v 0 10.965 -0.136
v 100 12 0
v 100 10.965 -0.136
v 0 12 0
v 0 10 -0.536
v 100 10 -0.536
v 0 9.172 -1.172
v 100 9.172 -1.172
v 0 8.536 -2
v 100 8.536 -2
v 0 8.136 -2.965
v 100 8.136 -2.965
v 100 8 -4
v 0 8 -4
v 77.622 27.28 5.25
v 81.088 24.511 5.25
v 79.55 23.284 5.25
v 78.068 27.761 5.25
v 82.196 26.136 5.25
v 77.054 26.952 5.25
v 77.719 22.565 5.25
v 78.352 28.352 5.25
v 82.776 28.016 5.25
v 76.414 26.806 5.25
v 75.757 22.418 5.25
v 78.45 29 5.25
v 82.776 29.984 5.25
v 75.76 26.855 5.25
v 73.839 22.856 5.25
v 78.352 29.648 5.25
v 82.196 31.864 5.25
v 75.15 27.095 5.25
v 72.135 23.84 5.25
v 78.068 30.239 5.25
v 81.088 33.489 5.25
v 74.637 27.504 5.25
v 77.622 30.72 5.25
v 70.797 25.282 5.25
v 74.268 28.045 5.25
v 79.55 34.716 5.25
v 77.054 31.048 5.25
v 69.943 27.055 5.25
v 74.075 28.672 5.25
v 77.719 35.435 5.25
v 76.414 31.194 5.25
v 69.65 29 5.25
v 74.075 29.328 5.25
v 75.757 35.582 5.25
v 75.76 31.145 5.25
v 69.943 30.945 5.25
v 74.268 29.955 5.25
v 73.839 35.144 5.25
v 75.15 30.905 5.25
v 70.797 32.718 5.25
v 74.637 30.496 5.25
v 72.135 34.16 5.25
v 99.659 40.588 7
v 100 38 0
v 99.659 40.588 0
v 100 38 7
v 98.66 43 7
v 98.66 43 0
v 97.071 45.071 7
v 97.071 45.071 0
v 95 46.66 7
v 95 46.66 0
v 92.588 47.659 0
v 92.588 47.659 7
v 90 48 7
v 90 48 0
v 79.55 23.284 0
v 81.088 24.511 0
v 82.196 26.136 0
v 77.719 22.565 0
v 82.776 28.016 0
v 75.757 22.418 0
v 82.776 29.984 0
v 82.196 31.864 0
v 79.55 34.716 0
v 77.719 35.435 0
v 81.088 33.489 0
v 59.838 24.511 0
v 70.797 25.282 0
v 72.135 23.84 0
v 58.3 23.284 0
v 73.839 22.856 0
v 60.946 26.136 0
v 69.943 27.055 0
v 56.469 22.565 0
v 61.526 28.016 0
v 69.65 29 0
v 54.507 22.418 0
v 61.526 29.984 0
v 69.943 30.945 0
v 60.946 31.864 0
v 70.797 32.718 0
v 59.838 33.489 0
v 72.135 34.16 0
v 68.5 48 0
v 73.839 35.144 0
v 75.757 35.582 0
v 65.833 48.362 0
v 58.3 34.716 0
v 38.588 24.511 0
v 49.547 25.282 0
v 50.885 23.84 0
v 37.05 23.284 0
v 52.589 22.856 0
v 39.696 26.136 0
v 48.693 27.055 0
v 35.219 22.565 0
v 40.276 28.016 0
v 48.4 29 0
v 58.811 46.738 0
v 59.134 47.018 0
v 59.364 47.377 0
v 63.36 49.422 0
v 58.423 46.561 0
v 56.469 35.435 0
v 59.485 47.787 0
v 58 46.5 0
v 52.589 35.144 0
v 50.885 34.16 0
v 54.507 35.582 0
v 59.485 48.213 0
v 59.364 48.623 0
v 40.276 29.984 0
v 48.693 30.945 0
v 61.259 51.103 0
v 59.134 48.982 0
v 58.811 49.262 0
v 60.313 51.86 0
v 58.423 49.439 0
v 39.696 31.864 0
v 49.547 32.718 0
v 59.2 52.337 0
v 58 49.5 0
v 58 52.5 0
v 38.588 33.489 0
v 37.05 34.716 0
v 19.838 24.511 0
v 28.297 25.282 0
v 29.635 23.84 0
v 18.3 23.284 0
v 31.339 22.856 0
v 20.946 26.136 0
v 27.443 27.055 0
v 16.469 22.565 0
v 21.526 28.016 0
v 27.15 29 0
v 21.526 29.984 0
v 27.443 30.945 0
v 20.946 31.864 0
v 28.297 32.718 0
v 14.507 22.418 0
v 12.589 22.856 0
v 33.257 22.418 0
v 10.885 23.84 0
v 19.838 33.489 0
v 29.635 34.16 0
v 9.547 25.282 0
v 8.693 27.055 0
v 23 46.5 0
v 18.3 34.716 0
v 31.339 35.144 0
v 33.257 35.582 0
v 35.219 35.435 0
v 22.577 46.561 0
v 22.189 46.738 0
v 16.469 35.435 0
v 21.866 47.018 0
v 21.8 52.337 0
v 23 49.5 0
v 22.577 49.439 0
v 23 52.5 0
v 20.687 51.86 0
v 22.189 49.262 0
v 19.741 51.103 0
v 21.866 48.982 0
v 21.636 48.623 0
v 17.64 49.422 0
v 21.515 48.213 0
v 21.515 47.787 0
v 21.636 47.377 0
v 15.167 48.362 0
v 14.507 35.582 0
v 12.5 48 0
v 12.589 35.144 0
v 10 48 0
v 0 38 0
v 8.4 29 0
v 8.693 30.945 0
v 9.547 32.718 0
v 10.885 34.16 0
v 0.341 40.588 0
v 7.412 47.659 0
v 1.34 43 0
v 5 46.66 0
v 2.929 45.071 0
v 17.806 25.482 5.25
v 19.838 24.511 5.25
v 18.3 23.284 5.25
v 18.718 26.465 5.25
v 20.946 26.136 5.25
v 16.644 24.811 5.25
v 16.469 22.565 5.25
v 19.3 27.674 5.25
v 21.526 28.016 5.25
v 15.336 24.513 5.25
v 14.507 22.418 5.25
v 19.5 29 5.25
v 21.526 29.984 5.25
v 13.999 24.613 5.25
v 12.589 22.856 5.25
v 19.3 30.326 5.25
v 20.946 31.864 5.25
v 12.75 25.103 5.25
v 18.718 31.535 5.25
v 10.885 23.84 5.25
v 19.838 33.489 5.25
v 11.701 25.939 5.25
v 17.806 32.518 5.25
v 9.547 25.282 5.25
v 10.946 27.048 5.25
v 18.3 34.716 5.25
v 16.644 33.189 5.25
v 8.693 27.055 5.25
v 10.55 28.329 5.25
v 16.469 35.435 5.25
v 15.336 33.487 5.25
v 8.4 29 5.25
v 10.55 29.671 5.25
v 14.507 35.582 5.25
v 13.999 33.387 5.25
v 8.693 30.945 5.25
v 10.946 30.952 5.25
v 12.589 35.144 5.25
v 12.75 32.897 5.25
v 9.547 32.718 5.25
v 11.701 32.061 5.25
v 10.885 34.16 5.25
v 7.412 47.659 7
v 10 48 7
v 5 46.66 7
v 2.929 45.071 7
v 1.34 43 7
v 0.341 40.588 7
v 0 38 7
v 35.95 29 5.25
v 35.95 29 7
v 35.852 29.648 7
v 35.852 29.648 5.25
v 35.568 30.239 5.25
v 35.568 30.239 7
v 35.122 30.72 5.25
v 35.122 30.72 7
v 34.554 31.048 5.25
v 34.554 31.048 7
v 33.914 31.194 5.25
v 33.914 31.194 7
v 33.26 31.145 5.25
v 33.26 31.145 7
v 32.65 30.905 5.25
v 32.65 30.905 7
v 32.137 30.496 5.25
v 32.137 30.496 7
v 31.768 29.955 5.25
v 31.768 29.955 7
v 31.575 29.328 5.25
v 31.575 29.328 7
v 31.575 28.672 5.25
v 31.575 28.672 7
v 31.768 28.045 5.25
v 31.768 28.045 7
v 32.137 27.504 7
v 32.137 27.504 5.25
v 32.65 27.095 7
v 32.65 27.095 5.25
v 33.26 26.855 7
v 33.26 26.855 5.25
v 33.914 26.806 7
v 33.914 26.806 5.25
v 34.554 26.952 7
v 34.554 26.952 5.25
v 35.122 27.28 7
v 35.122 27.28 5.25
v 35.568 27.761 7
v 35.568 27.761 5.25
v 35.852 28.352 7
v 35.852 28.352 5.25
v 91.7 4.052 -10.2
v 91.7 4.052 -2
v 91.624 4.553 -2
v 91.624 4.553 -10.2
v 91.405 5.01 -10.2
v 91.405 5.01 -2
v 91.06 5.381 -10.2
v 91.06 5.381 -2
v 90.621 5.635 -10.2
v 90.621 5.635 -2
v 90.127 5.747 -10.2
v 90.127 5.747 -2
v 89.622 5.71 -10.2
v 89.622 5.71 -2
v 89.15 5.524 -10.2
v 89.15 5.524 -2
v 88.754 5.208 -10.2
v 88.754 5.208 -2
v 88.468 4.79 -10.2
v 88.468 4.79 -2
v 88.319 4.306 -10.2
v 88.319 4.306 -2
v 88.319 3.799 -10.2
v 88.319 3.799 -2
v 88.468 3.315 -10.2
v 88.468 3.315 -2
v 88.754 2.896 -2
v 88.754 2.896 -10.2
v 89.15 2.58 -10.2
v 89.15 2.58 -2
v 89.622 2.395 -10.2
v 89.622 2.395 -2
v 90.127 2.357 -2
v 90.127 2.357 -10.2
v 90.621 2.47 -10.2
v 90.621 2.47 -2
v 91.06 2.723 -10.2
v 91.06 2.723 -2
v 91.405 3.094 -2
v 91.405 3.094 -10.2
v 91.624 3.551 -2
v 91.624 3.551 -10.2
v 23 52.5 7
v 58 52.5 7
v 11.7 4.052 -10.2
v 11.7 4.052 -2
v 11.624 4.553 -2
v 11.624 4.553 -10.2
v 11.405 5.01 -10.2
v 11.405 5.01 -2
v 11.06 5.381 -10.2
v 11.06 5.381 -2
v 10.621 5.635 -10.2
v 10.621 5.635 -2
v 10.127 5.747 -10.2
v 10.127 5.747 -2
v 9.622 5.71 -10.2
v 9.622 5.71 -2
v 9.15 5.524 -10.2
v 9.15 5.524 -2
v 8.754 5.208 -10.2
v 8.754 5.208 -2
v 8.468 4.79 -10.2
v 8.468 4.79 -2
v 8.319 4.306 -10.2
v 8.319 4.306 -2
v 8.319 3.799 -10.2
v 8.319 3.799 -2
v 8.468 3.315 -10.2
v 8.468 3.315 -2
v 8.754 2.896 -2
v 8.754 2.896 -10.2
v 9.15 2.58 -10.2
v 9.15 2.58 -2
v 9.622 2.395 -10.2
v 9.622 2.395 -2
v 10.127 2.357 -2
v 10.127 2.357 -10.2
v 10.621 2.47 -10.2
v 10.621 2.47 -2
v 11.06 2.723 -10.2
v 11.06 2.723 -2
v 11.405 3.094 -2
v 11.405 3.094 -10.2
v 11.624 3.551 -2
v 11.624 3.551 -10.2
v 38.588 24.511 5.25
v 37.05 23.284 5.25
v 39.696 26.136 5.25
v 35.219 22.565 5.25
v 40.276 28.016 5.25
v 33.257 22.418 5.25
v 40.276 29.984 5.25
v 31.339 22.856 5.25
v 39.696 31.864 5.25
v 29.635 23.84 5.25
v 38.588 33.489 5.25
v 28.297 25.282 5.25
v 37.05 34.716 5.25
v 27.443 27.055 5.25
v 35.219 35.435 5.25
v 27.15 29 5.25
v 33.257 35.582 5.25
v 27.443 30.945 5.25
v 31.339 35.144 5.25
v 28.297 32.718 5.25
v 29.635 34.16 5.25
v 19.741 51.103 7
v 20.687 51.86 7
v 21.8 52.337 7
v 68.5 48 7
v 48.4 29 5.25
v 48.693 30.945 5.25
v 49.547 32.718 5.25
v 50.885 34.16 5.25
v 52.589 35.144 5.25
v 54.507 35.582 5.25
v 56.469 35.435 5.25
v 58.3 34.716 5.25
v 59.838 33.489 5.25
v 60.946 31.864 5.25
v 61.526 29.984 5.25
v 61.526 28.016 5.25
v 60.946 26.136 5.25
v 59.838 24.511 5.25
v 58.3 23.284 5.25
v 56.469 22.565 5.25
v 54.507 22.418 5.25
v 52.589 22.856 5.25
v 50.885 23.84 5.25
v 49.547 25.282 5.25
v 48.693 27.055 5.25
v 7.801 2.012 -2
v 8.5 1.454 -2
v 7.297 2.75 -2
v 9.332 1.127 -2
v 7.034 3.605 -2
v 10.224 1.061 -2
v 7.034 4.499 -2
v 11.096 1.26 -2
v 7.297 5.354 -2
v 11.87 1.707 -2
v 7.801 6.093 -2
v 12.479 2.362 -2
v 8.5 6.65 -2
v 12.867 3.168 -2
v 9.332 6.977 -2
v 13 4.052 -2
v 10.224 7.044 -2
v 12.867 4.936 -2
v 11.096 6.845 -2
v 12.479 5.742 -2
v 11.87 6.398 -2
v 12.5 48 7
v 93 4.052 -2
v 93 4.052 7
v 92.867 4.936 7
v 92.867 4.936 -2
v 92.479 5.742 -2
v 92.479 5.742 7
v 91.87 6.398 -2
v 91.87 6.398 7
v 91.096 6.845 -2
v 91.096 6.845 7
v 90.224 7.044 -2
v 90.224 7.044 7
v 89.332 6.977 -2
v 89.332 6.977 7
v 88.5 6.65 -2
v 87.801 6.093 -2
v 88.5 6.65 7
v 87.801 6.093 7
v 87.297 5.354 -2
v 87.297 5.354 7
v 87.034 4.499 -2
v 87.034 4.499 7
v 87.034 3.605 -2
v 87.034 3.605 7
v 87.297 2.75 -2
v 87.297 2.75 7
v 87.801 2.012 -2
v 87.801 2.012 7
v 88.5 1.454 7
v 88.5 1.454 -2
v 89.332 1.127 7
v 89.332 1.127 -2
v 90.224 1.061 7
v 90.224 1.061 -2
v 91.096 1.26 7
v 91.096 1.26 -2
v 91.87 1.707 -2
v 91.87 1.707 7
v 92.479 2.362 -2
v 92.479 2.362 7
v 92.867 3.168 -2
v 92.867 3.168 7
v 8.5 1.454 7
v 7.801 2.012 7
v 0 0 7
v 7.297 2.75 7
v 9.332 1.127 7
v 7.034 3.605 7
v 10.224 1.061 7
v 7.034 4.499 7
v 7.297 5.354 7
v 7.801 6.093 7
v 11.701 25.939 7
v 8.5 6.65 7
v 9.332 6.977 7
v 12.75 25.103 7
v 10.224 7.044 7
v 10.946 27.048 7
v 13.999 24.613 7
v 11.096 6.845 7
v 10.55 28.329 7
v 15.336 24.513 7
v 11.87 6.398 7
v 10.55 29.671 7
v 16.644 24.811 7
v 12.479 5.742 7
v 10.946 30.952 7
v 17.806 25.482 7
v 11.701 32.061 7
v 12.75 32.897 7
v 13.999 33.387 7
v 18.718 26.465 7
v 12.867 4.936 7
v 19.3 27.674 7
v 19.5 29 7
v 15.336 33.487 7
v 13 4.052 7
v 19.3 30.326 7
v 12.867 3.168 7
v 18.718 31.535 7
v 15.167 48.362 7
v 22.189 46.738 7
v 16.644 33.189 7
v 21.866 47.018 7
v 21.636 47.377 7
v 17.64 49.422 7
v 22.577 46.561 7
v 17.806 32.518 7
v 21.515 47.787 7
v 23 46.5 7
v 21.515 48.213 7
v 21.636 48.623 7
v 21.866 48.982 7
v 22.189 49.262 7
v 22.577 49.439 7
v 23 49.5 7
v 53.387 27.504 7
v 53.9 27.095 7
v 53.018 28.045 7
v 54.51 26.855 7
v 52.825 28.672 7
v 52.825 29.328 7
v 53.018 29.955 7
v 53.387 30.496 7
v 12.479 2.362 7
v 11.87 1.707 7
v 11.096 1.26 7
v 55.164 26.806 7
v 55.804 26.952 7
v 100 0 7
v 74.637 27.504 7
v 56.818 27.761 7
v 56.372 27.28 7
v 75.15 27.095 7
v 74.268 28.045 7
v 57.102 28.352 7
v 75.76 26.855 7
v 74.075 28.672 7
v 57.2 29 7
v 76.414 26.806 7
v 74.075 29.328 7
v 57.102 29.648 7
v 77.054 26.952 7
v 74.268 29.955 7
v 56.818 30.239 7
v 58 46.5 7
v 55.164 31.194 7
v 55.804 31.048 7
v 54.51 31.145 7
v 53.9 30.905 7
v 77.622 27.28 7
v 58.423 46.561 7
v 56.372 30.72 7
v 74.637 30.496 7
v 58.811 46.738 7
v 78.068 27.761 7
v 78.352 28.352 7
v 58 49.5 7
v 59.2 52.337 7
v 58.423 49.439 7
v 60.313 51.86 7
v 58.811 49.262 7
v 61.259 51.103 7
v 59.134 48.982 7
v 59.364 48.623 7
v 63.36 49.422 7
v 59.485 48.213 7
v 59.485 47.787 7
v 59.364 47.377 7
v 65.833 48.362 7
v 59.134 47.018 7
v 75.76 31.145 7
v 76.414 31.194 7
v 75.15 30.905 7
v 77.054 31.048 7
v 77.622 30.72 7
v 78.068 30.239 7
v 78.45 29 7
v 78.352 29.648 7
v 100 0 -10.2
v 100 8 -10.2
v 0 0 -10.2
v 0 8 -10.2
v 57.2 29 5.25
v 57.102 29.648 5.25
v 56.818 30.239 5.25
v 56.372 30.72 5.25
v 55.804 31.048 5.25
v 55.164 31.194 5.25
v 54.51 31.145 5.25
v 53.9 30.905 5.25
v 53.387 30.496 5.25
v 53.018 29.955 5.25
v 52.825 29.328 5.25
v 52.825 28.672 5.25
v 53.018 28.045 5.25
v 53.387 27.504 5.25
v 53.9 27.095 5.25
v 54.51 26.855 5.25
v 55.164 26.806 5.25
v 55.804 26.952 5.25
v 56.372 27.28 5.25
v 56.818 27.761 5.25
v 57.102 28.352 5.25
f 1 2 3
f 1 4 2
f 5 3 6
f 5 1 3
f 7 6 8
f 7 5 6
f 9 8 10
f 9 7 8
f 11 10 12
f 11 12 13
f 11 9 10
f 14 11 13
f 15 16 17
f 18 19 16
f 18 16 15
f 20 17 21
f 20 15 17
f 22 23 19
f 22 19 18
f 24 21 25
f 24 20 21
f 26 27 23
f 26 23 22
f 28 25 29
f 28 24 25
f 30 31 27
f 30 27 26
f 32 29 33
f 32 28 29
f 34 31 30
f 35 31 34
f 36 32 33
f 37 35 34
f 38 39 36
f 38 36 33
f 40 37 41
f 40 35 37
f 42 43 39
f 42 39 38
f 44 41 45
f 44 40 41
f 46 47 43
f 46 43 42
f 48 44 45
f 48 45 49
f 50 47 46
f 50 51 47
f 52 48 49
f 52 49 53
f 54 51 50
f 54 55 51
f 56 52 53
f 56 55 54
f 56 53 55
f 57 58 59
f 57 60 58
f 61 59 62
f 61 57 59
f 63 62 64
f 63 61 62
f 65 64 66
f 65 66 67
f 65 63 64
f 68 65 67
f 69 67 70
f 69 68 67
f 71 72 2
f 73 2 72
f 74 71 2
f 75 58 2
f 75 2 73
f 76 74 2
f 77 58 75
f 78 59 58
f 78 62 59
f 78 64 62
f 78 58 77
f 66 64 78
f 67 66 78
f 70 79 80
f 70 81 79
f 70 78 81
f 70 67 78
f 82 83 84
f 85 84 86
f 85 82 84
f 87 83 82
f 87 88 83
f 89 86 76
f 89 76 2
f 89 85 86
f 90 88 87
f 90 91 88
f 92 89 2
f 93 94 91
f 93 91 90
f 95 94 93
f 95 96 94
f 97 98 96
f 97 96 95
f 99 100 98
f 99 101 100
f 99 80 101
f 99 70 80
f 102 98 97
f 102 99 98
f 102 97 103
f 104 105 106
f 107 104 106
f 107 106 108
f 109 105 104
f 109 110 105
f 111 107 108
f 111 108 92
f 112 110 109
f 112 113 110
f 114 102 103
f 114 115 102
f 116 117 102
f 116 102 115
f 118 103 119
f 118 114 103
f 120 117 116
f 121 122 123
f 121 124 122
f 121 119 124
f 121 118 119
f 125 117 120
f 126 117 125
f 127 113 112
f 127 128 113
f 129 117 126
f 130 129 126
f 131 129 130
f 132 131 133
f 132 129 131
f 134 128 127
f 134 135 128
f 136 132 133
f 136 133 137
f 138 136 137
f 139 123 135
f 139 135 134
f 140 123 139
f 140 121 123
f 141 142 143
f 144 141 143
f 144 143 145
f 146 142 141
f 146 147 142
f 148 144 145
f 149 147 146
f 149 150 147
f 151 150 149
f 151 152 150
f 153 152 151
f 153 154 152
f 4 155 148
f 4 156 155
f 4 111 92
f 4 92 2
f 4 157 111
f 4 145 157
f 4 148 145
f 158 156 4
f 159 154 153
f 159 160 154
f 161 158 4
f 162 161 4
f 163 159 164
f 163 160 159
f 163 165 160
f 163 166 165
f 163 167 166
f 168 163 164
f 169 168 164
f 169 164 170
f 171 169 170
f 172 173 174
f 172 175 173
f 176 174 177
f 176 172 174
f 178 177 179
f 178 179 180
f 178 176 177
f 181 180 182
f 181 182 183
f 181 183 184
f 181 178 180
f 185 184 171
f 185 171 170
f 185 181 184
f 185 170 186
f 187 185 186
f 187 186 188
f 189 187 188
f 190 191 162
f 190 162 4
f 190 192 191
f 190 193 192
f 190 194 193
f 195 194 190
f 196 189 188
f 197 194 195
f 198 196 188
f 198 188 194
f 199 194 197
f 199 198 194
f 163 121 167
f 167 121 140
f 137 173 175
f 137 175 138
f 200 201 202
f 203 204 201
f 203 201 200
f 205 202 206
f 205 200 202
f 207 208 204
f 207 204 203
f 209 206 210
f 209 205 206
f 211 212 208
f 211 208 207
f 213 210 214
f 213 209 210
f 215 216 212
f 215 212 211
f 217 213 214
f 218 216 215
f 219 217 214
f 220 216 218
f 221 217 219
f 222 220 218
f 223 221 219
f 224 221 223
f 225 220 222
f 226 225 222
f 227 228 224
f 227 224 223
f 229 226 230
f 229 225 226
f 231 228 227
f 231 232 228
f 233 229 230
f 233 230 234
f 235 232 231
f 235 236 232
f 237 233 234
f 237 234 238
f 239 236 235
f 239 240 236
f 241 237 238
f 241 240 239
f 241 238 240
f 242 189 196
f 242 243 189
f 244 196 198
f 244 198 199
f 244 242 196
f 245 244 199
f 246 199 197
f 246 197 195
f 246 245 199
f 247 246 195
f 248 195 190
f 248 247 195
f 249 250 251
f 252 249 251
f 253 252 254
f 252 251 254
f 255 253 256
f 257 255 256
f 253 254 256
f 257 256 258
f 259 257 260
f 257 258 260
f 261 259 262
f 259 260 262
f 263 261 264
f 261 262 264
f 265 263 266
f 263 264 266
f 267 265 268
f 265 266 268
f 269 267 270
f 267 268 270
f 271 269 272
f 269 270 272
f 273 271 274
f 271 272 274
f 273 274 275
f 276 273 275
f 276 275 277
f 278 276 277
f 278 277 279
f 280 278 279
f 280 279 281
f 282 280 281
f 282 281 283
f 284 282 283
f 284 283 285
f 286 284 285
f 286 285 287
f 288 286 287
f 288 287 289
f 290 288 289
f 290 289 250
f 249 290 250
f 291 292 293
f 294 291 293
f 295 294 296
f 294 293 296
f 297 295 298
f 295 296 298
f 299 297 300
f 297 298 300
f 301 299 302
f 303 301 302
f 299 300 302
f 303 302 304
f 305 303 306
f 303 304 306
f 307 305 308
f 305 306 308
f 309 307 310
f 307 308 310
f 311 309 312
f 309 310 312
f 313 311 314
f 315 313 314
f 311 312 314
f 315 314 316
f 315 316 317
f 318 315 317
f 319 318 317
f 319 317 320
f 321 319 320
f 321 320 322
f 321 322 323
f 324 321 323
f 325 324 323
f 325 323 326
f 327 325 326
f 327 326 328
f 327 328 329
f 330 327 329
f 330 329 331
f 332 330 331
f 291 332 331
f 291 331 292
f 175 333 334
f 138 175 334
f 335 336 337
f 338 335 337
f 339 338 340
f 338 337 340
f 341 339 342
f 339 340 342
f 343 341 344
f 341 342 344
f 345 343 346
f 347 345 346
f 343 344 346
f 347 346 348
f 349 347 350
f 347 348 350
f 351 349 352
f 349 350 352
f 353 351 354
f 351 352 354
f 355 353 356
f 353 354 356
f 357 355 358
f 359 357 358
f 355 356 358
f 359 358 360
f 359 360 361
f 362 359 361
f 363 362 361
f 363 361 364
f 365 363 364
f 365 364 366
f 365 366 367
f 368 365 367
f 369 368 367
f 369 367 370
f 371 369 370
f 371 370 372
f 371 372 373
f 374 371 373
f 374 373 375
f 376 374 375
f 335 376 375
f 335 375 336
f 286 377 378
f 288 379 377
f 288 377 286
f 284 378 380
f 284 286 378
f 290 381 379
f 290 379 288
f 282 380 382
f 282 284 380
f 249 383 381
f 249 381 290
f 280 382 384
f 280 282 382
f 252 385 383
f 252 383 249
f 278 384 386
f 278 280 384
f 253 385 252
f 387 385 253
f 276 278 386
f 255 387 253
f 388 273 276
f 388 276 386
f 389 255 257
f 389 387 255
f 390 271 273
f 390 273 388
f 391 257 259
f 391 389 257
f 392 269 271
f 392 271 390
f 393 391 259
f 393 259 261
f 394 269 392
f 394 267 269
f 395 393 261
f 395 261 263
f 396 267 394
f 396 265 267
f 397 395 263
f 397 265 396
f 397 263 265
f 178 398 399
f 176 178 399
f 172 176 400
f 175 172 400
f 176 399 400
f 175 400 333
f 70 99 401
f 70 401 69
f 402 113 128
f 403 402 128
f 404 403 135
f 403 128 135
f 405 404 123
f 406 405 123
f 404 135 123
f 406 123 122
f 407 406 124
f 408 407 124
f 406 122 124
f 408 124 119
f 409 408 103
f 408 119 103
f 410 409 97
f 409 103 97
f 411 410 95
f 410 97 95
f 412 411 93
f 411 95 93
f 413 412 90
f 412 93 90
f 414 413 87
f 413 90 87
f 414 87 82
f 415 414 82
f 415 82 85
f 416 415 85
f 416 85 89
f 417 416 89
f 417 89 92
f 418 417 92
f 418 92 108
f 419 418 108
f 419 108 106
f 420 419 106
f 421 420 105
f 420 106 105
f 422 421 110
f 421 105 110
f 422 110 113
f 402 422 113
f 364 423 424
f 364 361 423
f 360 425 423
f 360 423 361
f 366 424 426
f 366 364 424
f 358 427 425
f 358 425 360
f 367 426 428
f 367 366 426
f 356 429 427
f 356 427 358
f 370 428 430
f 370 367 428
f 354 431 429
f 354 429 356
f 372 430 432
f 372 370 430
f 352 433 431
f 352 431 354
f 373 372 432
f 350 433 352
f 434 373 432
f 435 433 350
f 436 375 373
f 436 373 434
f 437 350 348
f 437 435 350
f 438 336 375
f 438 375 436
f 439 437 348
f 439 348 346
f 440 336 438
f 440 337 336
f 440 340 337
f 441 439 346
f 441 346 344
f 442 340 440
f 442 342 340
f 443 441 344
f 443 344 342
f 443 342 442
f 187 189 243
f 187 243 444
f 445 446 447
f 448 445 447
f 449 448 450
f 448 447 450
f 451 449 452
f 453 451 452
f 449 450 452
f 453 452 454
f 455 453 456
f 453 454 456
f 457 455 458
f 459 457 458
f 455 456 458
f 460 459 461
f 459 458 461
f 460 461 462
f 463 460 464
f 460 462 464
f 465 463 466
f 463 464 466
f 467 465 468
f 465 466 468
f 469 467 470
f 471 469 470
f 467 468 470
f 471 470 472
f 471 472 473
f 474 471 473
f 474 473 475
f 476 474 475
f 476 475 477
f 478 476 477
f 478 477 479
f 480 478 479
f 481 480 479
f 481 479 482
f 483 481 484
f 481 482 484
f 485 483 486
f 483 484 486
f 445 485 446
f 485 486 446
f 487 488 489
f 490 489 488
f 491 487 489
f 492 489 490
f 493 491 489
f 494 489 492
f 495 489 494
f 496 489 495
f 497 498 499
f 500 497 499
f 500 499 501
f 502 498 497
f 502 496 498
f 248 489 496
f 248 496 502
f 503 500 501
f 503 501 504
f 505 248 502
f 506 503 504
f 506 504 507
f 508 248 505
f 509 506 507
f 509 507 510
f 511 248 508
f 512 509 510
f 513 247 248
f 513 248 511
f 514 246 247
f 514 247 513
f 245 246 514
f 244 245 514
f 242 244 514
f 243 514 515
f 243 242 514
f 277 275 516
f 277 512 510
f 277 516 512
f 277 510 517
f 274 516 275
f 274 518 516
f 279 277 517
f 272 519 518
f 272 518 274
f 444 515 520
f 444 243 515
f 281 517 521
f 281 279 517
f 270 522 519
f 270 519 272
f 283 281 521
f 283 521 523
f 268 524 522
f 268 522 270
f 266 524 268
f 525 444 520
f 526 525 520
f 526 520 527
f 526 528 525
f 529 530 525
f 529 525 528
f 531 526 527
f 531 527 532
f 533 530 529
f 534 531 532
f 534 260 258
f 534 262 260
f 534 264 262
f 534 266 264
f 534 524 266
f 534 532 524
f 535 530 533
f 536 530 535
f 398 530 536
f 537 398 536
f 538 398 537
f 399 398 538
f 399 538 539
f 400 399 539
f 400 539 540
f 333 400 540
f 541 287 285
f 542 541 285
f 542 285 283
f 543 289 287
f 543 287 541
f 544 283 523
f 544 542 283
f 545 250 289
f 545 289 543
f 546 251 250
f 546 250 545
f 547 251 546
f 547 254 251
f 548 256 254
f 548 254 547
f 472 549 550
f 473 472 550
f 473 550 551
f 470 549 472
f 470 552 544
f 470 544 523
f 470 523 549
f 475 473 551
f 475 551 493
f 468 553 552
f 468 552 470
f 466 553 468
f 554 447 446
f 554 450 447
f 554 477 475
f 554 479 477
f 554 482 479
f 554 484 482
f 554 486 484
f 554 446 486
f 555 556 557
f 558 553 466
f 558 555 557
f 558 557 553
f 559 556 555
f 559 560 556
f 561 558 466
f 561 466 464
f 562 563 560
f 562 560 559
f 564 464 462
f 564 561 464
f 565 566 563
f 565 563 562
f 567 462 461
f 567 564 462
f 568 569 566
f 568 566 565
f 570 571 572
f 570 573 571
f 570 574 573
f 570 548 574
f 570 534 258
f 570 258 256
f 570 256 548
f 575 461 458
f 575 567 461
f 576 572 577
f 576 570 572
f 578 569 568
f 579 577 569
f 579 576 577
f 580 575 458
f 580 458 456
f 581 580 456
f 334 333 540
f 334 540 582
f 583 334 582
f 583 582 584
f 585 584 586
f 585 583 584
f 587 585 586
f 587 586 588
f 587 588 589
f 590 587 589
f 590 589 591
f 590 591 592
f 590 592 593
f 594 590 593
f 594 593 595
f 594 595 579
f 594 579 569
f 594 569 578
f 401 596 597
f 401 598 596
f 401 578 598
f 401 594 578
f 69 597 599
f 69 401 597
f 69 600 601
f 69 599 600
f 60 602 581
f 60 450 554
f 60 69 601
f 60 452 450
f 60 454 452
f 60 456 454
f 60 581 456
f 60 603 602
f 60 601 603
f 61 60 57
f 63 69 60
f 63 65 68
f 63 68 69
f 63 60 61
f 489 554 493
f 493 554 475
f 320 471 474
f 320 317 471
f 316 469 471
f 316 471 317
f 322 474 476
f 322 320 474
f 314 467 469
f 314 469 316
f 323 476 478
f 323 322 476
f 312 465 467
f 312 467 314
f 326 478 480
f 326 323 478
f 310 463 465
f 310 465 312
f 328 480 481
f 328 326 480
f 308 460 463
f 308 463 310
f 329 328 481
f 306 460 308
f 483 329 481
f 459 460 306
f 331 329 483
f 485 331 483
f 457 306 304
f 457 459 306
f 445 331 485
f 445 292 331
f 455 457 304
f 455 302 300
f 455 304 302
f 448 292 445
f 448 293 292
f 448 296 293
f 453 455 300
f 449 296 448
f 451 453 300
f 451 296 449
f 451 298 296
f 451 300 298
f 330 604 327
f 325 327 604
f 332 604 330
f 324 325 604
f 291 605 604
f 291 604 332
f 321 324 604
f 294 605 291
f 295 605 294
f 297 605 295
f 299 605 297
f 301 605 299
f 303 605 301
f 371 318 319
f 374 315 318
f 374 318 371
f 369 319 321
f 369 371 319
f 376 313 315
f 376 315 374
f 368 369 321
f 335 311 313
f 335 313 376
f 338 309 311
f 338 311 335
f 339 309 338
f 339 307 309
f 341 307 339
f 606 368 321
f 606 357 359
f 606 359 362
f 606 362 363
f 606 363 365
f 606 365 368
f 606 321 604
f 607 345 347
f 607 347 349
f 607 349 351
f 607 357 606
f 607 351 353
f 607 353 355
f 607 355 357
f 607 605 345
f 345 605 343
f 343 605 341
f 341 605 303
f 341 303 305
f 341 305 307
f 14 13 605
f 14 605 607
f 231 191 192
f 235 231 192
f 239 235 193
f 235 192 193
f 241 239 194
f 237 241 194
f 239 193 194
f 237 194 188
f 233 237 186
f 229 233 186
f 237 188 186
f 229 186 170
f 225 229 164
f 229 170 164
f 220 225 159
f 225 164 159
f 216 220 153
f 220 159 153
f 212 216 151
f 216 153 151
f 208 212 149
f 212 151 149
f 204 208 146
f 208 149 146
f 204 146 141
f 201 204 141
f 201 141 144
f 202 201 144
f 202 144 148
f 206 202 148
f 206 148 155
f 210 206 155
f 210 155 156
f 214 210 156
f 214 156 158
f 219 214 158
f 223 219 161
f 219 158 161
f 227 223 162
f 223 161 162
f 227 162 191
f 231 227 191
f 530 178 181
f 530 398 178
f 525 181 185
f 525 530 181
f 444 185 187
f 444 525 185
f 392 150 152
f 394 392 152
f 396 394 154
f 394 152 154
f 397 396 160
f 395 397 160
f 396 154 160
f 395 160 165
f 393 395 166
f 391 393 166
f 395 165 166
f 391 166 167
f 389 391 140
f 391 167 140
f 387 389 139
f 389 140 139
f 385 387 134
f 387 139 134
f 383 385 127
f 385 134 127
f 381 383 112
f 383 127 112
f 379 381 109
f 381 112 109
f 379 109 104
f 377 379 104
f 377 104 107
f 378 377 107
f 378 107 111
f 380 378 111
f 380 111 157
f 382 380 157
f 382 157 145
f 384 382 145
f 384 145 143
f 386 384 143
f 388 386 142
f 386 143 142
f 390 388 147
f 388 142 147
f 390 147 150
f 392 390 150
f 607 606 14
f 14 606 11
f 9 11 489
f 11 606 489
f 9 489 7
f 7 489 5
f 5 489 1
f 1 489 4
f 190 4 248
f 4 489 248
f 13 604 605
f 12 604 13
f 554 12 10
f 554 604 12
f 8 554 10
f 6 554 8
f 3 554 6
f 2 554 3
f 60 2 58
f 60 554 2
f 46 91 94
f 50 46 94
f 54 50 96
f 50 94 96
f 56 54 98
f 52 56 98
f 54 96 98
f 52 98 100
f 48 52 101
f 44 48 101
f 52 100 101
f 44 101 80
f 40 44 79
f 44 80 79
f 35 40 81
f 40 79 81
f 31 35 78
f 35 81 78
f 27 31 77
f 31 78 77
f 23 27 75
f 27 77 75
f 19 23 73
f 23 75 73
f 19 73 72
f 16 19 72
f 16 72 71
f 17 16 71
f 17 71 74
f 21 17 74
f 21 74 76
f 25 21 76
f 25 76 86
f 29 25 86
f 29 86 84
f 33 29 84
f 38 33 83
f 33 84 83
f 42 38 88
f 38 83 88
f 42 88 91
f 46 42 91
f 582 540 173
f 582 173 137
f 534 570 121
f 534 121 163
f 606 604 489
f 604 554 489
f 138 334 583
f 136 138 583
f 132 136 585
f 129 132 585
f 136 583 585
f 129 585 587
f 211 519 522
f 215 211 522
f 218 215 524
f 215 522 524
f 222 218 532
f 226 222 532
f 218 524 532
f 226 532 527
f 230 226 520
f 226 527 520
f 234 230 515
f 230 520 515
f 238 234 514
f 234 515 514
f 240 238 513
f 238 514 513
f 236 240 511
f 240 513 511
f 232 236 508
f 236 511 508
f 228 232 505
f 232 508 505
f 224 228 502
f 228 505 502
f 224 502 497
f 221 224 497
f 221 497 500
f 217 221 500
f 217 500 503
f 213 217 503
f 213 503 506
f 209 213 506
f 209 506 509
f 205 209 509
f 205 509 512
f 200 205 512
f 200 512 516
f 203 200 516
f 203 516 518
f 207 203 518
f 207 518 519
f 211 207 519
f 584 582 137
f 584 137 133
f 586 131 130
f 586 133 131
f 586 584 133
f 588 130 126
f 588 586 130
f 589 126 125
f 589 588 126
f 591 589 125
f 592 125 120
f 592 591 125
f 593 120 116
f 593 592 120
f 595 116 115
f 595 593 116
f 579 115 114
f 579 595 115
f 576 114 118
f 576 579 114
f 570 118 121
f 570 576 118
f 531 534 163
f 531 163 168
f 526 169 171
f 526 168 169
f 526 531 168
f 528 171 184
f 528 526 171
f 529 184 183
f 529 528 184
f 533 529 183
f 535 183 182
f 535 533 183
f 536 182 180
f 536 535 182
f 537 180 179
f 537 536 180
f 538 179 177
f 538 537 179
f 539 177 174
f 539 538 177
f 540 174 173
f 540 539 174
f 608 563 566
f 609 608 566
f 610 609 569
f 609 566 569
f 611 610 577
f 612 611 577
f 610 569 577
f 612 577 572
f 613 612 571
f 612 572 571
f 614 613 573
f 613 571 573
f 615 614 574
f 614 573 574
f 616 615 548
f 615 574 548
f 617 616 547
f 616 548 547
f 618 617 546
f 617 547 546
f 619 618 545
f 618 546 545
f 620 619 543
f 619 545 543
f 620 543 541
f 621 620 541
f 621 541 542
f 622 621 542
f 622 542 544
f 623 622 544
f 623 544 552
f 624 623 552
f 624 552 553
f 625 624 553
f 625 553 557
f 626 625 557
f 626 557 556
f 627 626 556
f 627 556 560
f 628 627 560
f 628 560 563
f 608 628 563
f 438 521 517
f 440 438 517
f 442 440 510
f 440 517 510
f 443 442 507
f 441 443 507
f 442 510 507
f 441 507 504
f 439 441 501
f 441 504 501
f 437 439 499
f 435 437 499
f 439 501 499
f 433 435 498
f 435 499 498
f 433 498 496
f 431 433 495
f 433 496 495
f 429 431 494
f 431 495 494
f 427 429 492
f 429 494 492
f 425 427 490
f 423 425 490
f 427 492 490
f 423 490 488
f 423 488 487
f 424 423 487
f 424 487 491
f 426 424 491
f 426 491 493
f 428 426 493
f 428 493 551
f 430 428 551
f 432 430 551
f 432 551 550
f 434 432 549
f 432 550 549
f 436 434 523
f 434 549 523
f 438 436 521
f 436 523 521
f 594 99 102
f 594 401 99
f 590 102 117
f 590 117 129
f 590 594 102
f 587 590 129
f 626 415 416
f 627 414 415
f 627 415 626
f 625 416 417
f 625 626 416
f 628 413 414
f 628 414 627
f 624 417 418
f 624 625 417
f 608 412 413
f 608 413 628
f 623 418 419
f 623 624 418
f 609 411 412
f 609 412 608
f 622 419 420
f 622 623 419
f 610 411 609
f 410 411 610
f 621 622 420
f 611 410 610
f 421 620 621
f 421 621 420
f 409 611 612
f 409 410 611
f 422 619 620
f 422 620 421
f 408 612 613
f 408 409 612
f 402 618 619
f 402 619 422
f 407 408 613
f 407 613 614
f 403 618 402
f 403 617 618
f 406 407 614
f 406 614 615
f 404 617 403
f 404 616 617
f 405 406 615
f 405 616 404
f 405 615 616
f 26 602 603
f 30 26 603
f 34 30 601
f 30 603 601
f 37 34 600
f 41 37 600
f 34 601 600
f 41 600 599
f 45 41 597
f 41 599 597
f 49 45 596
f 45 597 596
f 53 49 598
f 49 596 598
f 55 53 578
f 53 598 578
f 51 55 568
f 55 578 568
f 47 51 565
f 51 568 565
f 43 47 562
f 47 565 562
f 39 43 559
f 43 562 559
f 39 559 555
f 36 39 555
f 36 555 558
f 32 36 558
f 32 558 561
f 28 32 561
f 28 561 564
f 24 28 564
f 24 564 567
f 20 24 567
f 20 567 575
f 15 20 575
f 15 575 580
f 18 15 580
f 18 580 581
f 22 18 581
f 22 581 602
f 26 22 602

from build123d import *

# Parameters (mm, degrees)
SKETCH1_W           = 100
SKETCH1_H           = 48
BOSS_EXTRUDE1_DEPTH = 7
CUT_EXTRUDE1_REACH  = 113.144
SKETCH2_R           = 4.5
SKETCH2_R_2         = 2.2
SKETCH3_W           = 100
SKETCH3_H           = 8
BOSS_EXTRUDE2_DEPTH = 10.2
SKETCH4_R           = 6.6
CUT_EXTRUDE2_DEPTH  = 5.25
SKETCH5_R           = 2.6
CUT_EXTRUDE3_DEPTH  = 7
SKETCH7_R           = 1.5
CUT_EXTRUDE4_DEPTH  = 112.391382072
CUT_EXTRUDE5_REACH  = 114.249
SKETCH8_R           = 1.7
SKETCH9_R           = 3
CUT_EXTRUDE6_DEPTH  = 9
BOSS_EXTRUDE3_DEPTH = 7
CUT_EXTRUDE7_REACH  = 116.246
FILLET1_R           = 10
FILLET2_R           = 10
SKETCH12_R          = 2.6
BOSS_EXTRUDE6_DEPTH = 17.2
FILLET3_R           = 4


with BuildPart() as part:
    # Sketch1 → Boss-Extrude1 (new body)
    with BuildSketch(Plane.XY):
        with Locations((50, 24)):
            Rectangle(SKETCH1_W, SKETCH1_H)
    extrude(amount=BOSS_EXTRUDE1_DEPTH)

    # Sketch2 → Cut-Extrude1 (cut, up to next)
    with BuildSketch(Plane.XY.offset(7), mode=Mode.PRIVATE) as cut_extrude1_sk1:
        with Locations((15, 29)):
            Circle(SKETCH2_R)
    cut_extrude1_tool1 = extrude(cut_extrude1_sk1.sketch, amount=-CUT_EXTRUDE1_REACH, mode=Mode.PRIVATE) & part.part
    # Sketch2 → Cut-Extrude1 (cut, up to next)
    with BuildSketch(Plane.XY.offset(7), mode=Mode.PRIVATE) as cut_extrude1_sk2:
        with Locations((33.75, 29)):
            Circle(SKETCH2_R_2)
    cut_extrude1_tool2 = extrude(cut_extrude1_sk2.sketch, amount=-CUT_EXTRUDE1_REACH, mode=Mode.PRIVATE) & part.part
    # Sketch2 → Cut-Extrude1 (cut, up to next)
    with BuildSketch(Plane.XY.offset(7), mode=Mode.PRIVATE) as cut_extrude1_sk3:
        with Locations((55, 29)):
            Circle(SKETCH2_R_2)
    cut_extrude1_tool3 = extrude(cut_extrude1_sk3.sketch, amount=-CUT_EXTRUDE1_REACH, mode=Mode.PRIVATE) & part.part
    # Sketch2 → Cut-Extrude1 (cut, up to next)
    with BuildSketch(Plane.XY.offset(7), mode=Mode.PRIVATE) as cut_extrude1_sk4:
        with Locations((76.25, 29)):
            Circle(SKETCH2_R_2)
    cut_extrude1_tool4 = extrude(cut_extrude1_sk4.sketch, amount=-CUT_EXTRUDE1_REACH, mode=Mode.PRIVATE) & part.part
    add(cut_extrude1_tool1.solids().sort_by_distance((15, 29, 7))[0], mode=Mode.SUBTRACT)
    add(cut_extrude1_tool2.solids().sort_by_distance((33.75, 29, 7))[0], mode=Mode.SUBTRACT)
    add(cut_extrude1_tool3.solids().sort_by_distance((55, 29, 7))[0], mode=Mode.SUBTRACT)
    add(cut_extrude1_tool4.solids().sort_by_distance((76.25, 29, 7))[0], mode=Mode.SUBTRACT)

    # Sketch3 → Boss-Extrude2 (add)
    with BuildSketch(Plane(origin=(0, 0, 0), x_dir=(-1, 0, 0), z_dir=(0, 0, -1))):
        with Locations((-50, 4)):
            Rectangle(SKETCH3_W, SKETCH3_H)
    extrude(amount=BOSS_EXTRUDE2_DEPTH)

    # Sketch4 → Cut-Extrude2 (cut)
    with BuildSketch(Plane(origin=(0, 0, 0), x_dir=(-1, 0, 0), z_dir=(0, 0, -1))):
        with Locations((-76.25, 29)):
            Circle(SKETCH4_R)
        with Locations((-55, 29)):
            Circle(SKETCH4_R)
        with Locations((-33.75, 29)):
            Circle(SKETCH4_R)
        with Locations((-15, 29)):
            Circle(SKETCH4_R)
    extrude(amount=-CUT_EXTRUDE2_DEPTH, mode=Mode.SUBTRACT)

    # Sketch5 → Cut-Extrude3 (cut)
    with BuildSketch(Plane.XY.offset(7)):
        with Locations((35.000022648, 4.052132501)):
            Circle(SKETCH5_R)
        with Locations((64.999977352, 4)):
            Circle(SKETCH5_R)
    extrude(amount=-CUT_EXTRUDE3_DEPTH, mode=Mode.SUBTRACT)

    # Sketch7 → Cut-Extrude4 (cut, through all)
    with BuildSketch(Plane.XY):
        with Locations((35.000022648, 4.052132501)):
            Circle(SKETCH7_R)
        with Locations((64.999977352, 4)):
            Circle(SKETCH7_R)
    extrude(amount=-CUT_EXTRUDE4_DEPTH, mode=Mode.SUBTRACT)

    # Sketch8 → Cut-Extrude5 (cut, up to next)
    with BuildSketch(Plane.XY.offset(7), mode=Mode.PRIVATE) as cut_extrude5_sk1:
        with Locations((10, 4.052132501)):
            Circle(SKETCH8_R)
    cut_extrude5_tool1 = extrude(cut_extrude5_sk1.sketch, amount=-CUT_EXTRUDE5_REACH, mode=Mode.PRIVATE) & part.part
    # Sketch8 → Cut-Extrude5 (cut, up to next)
    with BuildSketch(Plane.XY.offset(7), mode=Mode.PRIVATE) as cut_extrude5_sk2:
        with Locations((90, 4.052132501)):
            Circle(SKETCH8_R)
    cut_extrude5_tool2 = extrude(cut_extrude5_sk2.sketch, amount=-CUT_EXTRUDE5_REACH, mode=Mode.PRIVATE) & part.part
    add(cut_extrude5_tool1.solids().sort_by_distance((10, 4.052133, 7))[0], mode=Mode.SUBTRACT)
    add(cut_extrude5_tool2.solids().sort_by_distance((90, 4.052133, 7))[0], mode=Mode.SUBTRACT)

    # Sketch9 → Cut-Extrude6 (cut)
    with BuildSketch(Plane.XY.offset(7)):
        with Locations((10, 4.052132501)):
            Circle(SKETCH9_R)
        with Locations((90, 4.052132501)):
            Circle(SKETCH9_R)
    extrude(amount=-CUT_EXTRUDE6_DEPTH, mode=Mode.SUBTRACT)

    # Sketch10 → Boss-Extrude3 (add)
    with BuildSketch(Plane.XY.offset(7)):
        with BuildLine():
            Line((23, 52.5), (58, 52.5))
            ThreePointArc((58, 52.5), (62.5, 48), (58, 43.5))
            Line((58, 43.5), (23, 43.5))
            ThreePointArc((23, 43.5), (18.5, 48), (23, 52.5))
        make_face()
        with BuildLine():
            Line((23, 49.5), (58, 49.5))
            ThreePointArc((58, 49.5), (59.5, 48), (58, 46.5))
            Line((58, 46.5), (23, 46.5))
            ThreePointArc((23, 46.5), (21.5, 48), (23, 49.5))
        make_face(mode=Mode.SUBTRACT)
    extrude(amount=-BOSS_EXTRUDE3_DEPTH)

    # Sketch11 → Cut-Extrude7 (cut, up to next)
    with BuildSketch(Plane.XY.offset(7), mode=Mode.PRIVATE) as cut_extrude7_sk1:
        with BuildLine():
            Line((23, 49.5), (58, 49.5))
            ThreePointArc((58, 49.5), (59.5, 48), (58, 46.5))
            Line((58, 46.5), (23, 46.5))
            ThreePointArc((23, 46.5), (21.5, 48), (23, 49.5))
        make_face()
    cut_extrude7_tool1 = extrude(cut_extrude7_sk1.sketch, amount=-CUT_EXTRUDE7_REACH, mode=Mode.PRIVATE) & part.part
    add(cut_extrude7_tool1.solids().sort_by_distance((40.5, 48, 7))[0], mode=Mode.SUBTRACT)

    # Fillet1
    fillet1_edges = [part.edges().sort_by_distance(p)[0] for p in [
        (0, 48, 3.5),
        (100, 48, 3.5),
    ]]
    fillet(fillet1_edges, radius=FILLET1_R)

    # Fillet2
    fillet2_edges = [part.edges().sort_by_distance(p)[0] for p in [
        (18.5, 48, 3.5),
        (62.5, 48, 3.5),
    ]]
    fillet(fillet2_edges, radius=FILLET2_R)

    # Sketch12 → Boss-Extrude6 (add)
    with BuildSketch(Plane.XY.offset(7)):
        with Locations((35.000022648, 4.052132501)):
            Circle(SKETCH12_R)
        with Locations((64.999977352, 4)):
            Circle(SKETCH12_R)
    extrude(amount=-BOSS_EXTRUDE6_DEPTH)

    # Fillet3
    fillet3_edges = [part.edges().sort_by_distance(p)[0] for p in [
        (50, 8, 0),
    ]]
    fillet(fillet3_edges, radius=FILLET3_R)


solid = part.part
